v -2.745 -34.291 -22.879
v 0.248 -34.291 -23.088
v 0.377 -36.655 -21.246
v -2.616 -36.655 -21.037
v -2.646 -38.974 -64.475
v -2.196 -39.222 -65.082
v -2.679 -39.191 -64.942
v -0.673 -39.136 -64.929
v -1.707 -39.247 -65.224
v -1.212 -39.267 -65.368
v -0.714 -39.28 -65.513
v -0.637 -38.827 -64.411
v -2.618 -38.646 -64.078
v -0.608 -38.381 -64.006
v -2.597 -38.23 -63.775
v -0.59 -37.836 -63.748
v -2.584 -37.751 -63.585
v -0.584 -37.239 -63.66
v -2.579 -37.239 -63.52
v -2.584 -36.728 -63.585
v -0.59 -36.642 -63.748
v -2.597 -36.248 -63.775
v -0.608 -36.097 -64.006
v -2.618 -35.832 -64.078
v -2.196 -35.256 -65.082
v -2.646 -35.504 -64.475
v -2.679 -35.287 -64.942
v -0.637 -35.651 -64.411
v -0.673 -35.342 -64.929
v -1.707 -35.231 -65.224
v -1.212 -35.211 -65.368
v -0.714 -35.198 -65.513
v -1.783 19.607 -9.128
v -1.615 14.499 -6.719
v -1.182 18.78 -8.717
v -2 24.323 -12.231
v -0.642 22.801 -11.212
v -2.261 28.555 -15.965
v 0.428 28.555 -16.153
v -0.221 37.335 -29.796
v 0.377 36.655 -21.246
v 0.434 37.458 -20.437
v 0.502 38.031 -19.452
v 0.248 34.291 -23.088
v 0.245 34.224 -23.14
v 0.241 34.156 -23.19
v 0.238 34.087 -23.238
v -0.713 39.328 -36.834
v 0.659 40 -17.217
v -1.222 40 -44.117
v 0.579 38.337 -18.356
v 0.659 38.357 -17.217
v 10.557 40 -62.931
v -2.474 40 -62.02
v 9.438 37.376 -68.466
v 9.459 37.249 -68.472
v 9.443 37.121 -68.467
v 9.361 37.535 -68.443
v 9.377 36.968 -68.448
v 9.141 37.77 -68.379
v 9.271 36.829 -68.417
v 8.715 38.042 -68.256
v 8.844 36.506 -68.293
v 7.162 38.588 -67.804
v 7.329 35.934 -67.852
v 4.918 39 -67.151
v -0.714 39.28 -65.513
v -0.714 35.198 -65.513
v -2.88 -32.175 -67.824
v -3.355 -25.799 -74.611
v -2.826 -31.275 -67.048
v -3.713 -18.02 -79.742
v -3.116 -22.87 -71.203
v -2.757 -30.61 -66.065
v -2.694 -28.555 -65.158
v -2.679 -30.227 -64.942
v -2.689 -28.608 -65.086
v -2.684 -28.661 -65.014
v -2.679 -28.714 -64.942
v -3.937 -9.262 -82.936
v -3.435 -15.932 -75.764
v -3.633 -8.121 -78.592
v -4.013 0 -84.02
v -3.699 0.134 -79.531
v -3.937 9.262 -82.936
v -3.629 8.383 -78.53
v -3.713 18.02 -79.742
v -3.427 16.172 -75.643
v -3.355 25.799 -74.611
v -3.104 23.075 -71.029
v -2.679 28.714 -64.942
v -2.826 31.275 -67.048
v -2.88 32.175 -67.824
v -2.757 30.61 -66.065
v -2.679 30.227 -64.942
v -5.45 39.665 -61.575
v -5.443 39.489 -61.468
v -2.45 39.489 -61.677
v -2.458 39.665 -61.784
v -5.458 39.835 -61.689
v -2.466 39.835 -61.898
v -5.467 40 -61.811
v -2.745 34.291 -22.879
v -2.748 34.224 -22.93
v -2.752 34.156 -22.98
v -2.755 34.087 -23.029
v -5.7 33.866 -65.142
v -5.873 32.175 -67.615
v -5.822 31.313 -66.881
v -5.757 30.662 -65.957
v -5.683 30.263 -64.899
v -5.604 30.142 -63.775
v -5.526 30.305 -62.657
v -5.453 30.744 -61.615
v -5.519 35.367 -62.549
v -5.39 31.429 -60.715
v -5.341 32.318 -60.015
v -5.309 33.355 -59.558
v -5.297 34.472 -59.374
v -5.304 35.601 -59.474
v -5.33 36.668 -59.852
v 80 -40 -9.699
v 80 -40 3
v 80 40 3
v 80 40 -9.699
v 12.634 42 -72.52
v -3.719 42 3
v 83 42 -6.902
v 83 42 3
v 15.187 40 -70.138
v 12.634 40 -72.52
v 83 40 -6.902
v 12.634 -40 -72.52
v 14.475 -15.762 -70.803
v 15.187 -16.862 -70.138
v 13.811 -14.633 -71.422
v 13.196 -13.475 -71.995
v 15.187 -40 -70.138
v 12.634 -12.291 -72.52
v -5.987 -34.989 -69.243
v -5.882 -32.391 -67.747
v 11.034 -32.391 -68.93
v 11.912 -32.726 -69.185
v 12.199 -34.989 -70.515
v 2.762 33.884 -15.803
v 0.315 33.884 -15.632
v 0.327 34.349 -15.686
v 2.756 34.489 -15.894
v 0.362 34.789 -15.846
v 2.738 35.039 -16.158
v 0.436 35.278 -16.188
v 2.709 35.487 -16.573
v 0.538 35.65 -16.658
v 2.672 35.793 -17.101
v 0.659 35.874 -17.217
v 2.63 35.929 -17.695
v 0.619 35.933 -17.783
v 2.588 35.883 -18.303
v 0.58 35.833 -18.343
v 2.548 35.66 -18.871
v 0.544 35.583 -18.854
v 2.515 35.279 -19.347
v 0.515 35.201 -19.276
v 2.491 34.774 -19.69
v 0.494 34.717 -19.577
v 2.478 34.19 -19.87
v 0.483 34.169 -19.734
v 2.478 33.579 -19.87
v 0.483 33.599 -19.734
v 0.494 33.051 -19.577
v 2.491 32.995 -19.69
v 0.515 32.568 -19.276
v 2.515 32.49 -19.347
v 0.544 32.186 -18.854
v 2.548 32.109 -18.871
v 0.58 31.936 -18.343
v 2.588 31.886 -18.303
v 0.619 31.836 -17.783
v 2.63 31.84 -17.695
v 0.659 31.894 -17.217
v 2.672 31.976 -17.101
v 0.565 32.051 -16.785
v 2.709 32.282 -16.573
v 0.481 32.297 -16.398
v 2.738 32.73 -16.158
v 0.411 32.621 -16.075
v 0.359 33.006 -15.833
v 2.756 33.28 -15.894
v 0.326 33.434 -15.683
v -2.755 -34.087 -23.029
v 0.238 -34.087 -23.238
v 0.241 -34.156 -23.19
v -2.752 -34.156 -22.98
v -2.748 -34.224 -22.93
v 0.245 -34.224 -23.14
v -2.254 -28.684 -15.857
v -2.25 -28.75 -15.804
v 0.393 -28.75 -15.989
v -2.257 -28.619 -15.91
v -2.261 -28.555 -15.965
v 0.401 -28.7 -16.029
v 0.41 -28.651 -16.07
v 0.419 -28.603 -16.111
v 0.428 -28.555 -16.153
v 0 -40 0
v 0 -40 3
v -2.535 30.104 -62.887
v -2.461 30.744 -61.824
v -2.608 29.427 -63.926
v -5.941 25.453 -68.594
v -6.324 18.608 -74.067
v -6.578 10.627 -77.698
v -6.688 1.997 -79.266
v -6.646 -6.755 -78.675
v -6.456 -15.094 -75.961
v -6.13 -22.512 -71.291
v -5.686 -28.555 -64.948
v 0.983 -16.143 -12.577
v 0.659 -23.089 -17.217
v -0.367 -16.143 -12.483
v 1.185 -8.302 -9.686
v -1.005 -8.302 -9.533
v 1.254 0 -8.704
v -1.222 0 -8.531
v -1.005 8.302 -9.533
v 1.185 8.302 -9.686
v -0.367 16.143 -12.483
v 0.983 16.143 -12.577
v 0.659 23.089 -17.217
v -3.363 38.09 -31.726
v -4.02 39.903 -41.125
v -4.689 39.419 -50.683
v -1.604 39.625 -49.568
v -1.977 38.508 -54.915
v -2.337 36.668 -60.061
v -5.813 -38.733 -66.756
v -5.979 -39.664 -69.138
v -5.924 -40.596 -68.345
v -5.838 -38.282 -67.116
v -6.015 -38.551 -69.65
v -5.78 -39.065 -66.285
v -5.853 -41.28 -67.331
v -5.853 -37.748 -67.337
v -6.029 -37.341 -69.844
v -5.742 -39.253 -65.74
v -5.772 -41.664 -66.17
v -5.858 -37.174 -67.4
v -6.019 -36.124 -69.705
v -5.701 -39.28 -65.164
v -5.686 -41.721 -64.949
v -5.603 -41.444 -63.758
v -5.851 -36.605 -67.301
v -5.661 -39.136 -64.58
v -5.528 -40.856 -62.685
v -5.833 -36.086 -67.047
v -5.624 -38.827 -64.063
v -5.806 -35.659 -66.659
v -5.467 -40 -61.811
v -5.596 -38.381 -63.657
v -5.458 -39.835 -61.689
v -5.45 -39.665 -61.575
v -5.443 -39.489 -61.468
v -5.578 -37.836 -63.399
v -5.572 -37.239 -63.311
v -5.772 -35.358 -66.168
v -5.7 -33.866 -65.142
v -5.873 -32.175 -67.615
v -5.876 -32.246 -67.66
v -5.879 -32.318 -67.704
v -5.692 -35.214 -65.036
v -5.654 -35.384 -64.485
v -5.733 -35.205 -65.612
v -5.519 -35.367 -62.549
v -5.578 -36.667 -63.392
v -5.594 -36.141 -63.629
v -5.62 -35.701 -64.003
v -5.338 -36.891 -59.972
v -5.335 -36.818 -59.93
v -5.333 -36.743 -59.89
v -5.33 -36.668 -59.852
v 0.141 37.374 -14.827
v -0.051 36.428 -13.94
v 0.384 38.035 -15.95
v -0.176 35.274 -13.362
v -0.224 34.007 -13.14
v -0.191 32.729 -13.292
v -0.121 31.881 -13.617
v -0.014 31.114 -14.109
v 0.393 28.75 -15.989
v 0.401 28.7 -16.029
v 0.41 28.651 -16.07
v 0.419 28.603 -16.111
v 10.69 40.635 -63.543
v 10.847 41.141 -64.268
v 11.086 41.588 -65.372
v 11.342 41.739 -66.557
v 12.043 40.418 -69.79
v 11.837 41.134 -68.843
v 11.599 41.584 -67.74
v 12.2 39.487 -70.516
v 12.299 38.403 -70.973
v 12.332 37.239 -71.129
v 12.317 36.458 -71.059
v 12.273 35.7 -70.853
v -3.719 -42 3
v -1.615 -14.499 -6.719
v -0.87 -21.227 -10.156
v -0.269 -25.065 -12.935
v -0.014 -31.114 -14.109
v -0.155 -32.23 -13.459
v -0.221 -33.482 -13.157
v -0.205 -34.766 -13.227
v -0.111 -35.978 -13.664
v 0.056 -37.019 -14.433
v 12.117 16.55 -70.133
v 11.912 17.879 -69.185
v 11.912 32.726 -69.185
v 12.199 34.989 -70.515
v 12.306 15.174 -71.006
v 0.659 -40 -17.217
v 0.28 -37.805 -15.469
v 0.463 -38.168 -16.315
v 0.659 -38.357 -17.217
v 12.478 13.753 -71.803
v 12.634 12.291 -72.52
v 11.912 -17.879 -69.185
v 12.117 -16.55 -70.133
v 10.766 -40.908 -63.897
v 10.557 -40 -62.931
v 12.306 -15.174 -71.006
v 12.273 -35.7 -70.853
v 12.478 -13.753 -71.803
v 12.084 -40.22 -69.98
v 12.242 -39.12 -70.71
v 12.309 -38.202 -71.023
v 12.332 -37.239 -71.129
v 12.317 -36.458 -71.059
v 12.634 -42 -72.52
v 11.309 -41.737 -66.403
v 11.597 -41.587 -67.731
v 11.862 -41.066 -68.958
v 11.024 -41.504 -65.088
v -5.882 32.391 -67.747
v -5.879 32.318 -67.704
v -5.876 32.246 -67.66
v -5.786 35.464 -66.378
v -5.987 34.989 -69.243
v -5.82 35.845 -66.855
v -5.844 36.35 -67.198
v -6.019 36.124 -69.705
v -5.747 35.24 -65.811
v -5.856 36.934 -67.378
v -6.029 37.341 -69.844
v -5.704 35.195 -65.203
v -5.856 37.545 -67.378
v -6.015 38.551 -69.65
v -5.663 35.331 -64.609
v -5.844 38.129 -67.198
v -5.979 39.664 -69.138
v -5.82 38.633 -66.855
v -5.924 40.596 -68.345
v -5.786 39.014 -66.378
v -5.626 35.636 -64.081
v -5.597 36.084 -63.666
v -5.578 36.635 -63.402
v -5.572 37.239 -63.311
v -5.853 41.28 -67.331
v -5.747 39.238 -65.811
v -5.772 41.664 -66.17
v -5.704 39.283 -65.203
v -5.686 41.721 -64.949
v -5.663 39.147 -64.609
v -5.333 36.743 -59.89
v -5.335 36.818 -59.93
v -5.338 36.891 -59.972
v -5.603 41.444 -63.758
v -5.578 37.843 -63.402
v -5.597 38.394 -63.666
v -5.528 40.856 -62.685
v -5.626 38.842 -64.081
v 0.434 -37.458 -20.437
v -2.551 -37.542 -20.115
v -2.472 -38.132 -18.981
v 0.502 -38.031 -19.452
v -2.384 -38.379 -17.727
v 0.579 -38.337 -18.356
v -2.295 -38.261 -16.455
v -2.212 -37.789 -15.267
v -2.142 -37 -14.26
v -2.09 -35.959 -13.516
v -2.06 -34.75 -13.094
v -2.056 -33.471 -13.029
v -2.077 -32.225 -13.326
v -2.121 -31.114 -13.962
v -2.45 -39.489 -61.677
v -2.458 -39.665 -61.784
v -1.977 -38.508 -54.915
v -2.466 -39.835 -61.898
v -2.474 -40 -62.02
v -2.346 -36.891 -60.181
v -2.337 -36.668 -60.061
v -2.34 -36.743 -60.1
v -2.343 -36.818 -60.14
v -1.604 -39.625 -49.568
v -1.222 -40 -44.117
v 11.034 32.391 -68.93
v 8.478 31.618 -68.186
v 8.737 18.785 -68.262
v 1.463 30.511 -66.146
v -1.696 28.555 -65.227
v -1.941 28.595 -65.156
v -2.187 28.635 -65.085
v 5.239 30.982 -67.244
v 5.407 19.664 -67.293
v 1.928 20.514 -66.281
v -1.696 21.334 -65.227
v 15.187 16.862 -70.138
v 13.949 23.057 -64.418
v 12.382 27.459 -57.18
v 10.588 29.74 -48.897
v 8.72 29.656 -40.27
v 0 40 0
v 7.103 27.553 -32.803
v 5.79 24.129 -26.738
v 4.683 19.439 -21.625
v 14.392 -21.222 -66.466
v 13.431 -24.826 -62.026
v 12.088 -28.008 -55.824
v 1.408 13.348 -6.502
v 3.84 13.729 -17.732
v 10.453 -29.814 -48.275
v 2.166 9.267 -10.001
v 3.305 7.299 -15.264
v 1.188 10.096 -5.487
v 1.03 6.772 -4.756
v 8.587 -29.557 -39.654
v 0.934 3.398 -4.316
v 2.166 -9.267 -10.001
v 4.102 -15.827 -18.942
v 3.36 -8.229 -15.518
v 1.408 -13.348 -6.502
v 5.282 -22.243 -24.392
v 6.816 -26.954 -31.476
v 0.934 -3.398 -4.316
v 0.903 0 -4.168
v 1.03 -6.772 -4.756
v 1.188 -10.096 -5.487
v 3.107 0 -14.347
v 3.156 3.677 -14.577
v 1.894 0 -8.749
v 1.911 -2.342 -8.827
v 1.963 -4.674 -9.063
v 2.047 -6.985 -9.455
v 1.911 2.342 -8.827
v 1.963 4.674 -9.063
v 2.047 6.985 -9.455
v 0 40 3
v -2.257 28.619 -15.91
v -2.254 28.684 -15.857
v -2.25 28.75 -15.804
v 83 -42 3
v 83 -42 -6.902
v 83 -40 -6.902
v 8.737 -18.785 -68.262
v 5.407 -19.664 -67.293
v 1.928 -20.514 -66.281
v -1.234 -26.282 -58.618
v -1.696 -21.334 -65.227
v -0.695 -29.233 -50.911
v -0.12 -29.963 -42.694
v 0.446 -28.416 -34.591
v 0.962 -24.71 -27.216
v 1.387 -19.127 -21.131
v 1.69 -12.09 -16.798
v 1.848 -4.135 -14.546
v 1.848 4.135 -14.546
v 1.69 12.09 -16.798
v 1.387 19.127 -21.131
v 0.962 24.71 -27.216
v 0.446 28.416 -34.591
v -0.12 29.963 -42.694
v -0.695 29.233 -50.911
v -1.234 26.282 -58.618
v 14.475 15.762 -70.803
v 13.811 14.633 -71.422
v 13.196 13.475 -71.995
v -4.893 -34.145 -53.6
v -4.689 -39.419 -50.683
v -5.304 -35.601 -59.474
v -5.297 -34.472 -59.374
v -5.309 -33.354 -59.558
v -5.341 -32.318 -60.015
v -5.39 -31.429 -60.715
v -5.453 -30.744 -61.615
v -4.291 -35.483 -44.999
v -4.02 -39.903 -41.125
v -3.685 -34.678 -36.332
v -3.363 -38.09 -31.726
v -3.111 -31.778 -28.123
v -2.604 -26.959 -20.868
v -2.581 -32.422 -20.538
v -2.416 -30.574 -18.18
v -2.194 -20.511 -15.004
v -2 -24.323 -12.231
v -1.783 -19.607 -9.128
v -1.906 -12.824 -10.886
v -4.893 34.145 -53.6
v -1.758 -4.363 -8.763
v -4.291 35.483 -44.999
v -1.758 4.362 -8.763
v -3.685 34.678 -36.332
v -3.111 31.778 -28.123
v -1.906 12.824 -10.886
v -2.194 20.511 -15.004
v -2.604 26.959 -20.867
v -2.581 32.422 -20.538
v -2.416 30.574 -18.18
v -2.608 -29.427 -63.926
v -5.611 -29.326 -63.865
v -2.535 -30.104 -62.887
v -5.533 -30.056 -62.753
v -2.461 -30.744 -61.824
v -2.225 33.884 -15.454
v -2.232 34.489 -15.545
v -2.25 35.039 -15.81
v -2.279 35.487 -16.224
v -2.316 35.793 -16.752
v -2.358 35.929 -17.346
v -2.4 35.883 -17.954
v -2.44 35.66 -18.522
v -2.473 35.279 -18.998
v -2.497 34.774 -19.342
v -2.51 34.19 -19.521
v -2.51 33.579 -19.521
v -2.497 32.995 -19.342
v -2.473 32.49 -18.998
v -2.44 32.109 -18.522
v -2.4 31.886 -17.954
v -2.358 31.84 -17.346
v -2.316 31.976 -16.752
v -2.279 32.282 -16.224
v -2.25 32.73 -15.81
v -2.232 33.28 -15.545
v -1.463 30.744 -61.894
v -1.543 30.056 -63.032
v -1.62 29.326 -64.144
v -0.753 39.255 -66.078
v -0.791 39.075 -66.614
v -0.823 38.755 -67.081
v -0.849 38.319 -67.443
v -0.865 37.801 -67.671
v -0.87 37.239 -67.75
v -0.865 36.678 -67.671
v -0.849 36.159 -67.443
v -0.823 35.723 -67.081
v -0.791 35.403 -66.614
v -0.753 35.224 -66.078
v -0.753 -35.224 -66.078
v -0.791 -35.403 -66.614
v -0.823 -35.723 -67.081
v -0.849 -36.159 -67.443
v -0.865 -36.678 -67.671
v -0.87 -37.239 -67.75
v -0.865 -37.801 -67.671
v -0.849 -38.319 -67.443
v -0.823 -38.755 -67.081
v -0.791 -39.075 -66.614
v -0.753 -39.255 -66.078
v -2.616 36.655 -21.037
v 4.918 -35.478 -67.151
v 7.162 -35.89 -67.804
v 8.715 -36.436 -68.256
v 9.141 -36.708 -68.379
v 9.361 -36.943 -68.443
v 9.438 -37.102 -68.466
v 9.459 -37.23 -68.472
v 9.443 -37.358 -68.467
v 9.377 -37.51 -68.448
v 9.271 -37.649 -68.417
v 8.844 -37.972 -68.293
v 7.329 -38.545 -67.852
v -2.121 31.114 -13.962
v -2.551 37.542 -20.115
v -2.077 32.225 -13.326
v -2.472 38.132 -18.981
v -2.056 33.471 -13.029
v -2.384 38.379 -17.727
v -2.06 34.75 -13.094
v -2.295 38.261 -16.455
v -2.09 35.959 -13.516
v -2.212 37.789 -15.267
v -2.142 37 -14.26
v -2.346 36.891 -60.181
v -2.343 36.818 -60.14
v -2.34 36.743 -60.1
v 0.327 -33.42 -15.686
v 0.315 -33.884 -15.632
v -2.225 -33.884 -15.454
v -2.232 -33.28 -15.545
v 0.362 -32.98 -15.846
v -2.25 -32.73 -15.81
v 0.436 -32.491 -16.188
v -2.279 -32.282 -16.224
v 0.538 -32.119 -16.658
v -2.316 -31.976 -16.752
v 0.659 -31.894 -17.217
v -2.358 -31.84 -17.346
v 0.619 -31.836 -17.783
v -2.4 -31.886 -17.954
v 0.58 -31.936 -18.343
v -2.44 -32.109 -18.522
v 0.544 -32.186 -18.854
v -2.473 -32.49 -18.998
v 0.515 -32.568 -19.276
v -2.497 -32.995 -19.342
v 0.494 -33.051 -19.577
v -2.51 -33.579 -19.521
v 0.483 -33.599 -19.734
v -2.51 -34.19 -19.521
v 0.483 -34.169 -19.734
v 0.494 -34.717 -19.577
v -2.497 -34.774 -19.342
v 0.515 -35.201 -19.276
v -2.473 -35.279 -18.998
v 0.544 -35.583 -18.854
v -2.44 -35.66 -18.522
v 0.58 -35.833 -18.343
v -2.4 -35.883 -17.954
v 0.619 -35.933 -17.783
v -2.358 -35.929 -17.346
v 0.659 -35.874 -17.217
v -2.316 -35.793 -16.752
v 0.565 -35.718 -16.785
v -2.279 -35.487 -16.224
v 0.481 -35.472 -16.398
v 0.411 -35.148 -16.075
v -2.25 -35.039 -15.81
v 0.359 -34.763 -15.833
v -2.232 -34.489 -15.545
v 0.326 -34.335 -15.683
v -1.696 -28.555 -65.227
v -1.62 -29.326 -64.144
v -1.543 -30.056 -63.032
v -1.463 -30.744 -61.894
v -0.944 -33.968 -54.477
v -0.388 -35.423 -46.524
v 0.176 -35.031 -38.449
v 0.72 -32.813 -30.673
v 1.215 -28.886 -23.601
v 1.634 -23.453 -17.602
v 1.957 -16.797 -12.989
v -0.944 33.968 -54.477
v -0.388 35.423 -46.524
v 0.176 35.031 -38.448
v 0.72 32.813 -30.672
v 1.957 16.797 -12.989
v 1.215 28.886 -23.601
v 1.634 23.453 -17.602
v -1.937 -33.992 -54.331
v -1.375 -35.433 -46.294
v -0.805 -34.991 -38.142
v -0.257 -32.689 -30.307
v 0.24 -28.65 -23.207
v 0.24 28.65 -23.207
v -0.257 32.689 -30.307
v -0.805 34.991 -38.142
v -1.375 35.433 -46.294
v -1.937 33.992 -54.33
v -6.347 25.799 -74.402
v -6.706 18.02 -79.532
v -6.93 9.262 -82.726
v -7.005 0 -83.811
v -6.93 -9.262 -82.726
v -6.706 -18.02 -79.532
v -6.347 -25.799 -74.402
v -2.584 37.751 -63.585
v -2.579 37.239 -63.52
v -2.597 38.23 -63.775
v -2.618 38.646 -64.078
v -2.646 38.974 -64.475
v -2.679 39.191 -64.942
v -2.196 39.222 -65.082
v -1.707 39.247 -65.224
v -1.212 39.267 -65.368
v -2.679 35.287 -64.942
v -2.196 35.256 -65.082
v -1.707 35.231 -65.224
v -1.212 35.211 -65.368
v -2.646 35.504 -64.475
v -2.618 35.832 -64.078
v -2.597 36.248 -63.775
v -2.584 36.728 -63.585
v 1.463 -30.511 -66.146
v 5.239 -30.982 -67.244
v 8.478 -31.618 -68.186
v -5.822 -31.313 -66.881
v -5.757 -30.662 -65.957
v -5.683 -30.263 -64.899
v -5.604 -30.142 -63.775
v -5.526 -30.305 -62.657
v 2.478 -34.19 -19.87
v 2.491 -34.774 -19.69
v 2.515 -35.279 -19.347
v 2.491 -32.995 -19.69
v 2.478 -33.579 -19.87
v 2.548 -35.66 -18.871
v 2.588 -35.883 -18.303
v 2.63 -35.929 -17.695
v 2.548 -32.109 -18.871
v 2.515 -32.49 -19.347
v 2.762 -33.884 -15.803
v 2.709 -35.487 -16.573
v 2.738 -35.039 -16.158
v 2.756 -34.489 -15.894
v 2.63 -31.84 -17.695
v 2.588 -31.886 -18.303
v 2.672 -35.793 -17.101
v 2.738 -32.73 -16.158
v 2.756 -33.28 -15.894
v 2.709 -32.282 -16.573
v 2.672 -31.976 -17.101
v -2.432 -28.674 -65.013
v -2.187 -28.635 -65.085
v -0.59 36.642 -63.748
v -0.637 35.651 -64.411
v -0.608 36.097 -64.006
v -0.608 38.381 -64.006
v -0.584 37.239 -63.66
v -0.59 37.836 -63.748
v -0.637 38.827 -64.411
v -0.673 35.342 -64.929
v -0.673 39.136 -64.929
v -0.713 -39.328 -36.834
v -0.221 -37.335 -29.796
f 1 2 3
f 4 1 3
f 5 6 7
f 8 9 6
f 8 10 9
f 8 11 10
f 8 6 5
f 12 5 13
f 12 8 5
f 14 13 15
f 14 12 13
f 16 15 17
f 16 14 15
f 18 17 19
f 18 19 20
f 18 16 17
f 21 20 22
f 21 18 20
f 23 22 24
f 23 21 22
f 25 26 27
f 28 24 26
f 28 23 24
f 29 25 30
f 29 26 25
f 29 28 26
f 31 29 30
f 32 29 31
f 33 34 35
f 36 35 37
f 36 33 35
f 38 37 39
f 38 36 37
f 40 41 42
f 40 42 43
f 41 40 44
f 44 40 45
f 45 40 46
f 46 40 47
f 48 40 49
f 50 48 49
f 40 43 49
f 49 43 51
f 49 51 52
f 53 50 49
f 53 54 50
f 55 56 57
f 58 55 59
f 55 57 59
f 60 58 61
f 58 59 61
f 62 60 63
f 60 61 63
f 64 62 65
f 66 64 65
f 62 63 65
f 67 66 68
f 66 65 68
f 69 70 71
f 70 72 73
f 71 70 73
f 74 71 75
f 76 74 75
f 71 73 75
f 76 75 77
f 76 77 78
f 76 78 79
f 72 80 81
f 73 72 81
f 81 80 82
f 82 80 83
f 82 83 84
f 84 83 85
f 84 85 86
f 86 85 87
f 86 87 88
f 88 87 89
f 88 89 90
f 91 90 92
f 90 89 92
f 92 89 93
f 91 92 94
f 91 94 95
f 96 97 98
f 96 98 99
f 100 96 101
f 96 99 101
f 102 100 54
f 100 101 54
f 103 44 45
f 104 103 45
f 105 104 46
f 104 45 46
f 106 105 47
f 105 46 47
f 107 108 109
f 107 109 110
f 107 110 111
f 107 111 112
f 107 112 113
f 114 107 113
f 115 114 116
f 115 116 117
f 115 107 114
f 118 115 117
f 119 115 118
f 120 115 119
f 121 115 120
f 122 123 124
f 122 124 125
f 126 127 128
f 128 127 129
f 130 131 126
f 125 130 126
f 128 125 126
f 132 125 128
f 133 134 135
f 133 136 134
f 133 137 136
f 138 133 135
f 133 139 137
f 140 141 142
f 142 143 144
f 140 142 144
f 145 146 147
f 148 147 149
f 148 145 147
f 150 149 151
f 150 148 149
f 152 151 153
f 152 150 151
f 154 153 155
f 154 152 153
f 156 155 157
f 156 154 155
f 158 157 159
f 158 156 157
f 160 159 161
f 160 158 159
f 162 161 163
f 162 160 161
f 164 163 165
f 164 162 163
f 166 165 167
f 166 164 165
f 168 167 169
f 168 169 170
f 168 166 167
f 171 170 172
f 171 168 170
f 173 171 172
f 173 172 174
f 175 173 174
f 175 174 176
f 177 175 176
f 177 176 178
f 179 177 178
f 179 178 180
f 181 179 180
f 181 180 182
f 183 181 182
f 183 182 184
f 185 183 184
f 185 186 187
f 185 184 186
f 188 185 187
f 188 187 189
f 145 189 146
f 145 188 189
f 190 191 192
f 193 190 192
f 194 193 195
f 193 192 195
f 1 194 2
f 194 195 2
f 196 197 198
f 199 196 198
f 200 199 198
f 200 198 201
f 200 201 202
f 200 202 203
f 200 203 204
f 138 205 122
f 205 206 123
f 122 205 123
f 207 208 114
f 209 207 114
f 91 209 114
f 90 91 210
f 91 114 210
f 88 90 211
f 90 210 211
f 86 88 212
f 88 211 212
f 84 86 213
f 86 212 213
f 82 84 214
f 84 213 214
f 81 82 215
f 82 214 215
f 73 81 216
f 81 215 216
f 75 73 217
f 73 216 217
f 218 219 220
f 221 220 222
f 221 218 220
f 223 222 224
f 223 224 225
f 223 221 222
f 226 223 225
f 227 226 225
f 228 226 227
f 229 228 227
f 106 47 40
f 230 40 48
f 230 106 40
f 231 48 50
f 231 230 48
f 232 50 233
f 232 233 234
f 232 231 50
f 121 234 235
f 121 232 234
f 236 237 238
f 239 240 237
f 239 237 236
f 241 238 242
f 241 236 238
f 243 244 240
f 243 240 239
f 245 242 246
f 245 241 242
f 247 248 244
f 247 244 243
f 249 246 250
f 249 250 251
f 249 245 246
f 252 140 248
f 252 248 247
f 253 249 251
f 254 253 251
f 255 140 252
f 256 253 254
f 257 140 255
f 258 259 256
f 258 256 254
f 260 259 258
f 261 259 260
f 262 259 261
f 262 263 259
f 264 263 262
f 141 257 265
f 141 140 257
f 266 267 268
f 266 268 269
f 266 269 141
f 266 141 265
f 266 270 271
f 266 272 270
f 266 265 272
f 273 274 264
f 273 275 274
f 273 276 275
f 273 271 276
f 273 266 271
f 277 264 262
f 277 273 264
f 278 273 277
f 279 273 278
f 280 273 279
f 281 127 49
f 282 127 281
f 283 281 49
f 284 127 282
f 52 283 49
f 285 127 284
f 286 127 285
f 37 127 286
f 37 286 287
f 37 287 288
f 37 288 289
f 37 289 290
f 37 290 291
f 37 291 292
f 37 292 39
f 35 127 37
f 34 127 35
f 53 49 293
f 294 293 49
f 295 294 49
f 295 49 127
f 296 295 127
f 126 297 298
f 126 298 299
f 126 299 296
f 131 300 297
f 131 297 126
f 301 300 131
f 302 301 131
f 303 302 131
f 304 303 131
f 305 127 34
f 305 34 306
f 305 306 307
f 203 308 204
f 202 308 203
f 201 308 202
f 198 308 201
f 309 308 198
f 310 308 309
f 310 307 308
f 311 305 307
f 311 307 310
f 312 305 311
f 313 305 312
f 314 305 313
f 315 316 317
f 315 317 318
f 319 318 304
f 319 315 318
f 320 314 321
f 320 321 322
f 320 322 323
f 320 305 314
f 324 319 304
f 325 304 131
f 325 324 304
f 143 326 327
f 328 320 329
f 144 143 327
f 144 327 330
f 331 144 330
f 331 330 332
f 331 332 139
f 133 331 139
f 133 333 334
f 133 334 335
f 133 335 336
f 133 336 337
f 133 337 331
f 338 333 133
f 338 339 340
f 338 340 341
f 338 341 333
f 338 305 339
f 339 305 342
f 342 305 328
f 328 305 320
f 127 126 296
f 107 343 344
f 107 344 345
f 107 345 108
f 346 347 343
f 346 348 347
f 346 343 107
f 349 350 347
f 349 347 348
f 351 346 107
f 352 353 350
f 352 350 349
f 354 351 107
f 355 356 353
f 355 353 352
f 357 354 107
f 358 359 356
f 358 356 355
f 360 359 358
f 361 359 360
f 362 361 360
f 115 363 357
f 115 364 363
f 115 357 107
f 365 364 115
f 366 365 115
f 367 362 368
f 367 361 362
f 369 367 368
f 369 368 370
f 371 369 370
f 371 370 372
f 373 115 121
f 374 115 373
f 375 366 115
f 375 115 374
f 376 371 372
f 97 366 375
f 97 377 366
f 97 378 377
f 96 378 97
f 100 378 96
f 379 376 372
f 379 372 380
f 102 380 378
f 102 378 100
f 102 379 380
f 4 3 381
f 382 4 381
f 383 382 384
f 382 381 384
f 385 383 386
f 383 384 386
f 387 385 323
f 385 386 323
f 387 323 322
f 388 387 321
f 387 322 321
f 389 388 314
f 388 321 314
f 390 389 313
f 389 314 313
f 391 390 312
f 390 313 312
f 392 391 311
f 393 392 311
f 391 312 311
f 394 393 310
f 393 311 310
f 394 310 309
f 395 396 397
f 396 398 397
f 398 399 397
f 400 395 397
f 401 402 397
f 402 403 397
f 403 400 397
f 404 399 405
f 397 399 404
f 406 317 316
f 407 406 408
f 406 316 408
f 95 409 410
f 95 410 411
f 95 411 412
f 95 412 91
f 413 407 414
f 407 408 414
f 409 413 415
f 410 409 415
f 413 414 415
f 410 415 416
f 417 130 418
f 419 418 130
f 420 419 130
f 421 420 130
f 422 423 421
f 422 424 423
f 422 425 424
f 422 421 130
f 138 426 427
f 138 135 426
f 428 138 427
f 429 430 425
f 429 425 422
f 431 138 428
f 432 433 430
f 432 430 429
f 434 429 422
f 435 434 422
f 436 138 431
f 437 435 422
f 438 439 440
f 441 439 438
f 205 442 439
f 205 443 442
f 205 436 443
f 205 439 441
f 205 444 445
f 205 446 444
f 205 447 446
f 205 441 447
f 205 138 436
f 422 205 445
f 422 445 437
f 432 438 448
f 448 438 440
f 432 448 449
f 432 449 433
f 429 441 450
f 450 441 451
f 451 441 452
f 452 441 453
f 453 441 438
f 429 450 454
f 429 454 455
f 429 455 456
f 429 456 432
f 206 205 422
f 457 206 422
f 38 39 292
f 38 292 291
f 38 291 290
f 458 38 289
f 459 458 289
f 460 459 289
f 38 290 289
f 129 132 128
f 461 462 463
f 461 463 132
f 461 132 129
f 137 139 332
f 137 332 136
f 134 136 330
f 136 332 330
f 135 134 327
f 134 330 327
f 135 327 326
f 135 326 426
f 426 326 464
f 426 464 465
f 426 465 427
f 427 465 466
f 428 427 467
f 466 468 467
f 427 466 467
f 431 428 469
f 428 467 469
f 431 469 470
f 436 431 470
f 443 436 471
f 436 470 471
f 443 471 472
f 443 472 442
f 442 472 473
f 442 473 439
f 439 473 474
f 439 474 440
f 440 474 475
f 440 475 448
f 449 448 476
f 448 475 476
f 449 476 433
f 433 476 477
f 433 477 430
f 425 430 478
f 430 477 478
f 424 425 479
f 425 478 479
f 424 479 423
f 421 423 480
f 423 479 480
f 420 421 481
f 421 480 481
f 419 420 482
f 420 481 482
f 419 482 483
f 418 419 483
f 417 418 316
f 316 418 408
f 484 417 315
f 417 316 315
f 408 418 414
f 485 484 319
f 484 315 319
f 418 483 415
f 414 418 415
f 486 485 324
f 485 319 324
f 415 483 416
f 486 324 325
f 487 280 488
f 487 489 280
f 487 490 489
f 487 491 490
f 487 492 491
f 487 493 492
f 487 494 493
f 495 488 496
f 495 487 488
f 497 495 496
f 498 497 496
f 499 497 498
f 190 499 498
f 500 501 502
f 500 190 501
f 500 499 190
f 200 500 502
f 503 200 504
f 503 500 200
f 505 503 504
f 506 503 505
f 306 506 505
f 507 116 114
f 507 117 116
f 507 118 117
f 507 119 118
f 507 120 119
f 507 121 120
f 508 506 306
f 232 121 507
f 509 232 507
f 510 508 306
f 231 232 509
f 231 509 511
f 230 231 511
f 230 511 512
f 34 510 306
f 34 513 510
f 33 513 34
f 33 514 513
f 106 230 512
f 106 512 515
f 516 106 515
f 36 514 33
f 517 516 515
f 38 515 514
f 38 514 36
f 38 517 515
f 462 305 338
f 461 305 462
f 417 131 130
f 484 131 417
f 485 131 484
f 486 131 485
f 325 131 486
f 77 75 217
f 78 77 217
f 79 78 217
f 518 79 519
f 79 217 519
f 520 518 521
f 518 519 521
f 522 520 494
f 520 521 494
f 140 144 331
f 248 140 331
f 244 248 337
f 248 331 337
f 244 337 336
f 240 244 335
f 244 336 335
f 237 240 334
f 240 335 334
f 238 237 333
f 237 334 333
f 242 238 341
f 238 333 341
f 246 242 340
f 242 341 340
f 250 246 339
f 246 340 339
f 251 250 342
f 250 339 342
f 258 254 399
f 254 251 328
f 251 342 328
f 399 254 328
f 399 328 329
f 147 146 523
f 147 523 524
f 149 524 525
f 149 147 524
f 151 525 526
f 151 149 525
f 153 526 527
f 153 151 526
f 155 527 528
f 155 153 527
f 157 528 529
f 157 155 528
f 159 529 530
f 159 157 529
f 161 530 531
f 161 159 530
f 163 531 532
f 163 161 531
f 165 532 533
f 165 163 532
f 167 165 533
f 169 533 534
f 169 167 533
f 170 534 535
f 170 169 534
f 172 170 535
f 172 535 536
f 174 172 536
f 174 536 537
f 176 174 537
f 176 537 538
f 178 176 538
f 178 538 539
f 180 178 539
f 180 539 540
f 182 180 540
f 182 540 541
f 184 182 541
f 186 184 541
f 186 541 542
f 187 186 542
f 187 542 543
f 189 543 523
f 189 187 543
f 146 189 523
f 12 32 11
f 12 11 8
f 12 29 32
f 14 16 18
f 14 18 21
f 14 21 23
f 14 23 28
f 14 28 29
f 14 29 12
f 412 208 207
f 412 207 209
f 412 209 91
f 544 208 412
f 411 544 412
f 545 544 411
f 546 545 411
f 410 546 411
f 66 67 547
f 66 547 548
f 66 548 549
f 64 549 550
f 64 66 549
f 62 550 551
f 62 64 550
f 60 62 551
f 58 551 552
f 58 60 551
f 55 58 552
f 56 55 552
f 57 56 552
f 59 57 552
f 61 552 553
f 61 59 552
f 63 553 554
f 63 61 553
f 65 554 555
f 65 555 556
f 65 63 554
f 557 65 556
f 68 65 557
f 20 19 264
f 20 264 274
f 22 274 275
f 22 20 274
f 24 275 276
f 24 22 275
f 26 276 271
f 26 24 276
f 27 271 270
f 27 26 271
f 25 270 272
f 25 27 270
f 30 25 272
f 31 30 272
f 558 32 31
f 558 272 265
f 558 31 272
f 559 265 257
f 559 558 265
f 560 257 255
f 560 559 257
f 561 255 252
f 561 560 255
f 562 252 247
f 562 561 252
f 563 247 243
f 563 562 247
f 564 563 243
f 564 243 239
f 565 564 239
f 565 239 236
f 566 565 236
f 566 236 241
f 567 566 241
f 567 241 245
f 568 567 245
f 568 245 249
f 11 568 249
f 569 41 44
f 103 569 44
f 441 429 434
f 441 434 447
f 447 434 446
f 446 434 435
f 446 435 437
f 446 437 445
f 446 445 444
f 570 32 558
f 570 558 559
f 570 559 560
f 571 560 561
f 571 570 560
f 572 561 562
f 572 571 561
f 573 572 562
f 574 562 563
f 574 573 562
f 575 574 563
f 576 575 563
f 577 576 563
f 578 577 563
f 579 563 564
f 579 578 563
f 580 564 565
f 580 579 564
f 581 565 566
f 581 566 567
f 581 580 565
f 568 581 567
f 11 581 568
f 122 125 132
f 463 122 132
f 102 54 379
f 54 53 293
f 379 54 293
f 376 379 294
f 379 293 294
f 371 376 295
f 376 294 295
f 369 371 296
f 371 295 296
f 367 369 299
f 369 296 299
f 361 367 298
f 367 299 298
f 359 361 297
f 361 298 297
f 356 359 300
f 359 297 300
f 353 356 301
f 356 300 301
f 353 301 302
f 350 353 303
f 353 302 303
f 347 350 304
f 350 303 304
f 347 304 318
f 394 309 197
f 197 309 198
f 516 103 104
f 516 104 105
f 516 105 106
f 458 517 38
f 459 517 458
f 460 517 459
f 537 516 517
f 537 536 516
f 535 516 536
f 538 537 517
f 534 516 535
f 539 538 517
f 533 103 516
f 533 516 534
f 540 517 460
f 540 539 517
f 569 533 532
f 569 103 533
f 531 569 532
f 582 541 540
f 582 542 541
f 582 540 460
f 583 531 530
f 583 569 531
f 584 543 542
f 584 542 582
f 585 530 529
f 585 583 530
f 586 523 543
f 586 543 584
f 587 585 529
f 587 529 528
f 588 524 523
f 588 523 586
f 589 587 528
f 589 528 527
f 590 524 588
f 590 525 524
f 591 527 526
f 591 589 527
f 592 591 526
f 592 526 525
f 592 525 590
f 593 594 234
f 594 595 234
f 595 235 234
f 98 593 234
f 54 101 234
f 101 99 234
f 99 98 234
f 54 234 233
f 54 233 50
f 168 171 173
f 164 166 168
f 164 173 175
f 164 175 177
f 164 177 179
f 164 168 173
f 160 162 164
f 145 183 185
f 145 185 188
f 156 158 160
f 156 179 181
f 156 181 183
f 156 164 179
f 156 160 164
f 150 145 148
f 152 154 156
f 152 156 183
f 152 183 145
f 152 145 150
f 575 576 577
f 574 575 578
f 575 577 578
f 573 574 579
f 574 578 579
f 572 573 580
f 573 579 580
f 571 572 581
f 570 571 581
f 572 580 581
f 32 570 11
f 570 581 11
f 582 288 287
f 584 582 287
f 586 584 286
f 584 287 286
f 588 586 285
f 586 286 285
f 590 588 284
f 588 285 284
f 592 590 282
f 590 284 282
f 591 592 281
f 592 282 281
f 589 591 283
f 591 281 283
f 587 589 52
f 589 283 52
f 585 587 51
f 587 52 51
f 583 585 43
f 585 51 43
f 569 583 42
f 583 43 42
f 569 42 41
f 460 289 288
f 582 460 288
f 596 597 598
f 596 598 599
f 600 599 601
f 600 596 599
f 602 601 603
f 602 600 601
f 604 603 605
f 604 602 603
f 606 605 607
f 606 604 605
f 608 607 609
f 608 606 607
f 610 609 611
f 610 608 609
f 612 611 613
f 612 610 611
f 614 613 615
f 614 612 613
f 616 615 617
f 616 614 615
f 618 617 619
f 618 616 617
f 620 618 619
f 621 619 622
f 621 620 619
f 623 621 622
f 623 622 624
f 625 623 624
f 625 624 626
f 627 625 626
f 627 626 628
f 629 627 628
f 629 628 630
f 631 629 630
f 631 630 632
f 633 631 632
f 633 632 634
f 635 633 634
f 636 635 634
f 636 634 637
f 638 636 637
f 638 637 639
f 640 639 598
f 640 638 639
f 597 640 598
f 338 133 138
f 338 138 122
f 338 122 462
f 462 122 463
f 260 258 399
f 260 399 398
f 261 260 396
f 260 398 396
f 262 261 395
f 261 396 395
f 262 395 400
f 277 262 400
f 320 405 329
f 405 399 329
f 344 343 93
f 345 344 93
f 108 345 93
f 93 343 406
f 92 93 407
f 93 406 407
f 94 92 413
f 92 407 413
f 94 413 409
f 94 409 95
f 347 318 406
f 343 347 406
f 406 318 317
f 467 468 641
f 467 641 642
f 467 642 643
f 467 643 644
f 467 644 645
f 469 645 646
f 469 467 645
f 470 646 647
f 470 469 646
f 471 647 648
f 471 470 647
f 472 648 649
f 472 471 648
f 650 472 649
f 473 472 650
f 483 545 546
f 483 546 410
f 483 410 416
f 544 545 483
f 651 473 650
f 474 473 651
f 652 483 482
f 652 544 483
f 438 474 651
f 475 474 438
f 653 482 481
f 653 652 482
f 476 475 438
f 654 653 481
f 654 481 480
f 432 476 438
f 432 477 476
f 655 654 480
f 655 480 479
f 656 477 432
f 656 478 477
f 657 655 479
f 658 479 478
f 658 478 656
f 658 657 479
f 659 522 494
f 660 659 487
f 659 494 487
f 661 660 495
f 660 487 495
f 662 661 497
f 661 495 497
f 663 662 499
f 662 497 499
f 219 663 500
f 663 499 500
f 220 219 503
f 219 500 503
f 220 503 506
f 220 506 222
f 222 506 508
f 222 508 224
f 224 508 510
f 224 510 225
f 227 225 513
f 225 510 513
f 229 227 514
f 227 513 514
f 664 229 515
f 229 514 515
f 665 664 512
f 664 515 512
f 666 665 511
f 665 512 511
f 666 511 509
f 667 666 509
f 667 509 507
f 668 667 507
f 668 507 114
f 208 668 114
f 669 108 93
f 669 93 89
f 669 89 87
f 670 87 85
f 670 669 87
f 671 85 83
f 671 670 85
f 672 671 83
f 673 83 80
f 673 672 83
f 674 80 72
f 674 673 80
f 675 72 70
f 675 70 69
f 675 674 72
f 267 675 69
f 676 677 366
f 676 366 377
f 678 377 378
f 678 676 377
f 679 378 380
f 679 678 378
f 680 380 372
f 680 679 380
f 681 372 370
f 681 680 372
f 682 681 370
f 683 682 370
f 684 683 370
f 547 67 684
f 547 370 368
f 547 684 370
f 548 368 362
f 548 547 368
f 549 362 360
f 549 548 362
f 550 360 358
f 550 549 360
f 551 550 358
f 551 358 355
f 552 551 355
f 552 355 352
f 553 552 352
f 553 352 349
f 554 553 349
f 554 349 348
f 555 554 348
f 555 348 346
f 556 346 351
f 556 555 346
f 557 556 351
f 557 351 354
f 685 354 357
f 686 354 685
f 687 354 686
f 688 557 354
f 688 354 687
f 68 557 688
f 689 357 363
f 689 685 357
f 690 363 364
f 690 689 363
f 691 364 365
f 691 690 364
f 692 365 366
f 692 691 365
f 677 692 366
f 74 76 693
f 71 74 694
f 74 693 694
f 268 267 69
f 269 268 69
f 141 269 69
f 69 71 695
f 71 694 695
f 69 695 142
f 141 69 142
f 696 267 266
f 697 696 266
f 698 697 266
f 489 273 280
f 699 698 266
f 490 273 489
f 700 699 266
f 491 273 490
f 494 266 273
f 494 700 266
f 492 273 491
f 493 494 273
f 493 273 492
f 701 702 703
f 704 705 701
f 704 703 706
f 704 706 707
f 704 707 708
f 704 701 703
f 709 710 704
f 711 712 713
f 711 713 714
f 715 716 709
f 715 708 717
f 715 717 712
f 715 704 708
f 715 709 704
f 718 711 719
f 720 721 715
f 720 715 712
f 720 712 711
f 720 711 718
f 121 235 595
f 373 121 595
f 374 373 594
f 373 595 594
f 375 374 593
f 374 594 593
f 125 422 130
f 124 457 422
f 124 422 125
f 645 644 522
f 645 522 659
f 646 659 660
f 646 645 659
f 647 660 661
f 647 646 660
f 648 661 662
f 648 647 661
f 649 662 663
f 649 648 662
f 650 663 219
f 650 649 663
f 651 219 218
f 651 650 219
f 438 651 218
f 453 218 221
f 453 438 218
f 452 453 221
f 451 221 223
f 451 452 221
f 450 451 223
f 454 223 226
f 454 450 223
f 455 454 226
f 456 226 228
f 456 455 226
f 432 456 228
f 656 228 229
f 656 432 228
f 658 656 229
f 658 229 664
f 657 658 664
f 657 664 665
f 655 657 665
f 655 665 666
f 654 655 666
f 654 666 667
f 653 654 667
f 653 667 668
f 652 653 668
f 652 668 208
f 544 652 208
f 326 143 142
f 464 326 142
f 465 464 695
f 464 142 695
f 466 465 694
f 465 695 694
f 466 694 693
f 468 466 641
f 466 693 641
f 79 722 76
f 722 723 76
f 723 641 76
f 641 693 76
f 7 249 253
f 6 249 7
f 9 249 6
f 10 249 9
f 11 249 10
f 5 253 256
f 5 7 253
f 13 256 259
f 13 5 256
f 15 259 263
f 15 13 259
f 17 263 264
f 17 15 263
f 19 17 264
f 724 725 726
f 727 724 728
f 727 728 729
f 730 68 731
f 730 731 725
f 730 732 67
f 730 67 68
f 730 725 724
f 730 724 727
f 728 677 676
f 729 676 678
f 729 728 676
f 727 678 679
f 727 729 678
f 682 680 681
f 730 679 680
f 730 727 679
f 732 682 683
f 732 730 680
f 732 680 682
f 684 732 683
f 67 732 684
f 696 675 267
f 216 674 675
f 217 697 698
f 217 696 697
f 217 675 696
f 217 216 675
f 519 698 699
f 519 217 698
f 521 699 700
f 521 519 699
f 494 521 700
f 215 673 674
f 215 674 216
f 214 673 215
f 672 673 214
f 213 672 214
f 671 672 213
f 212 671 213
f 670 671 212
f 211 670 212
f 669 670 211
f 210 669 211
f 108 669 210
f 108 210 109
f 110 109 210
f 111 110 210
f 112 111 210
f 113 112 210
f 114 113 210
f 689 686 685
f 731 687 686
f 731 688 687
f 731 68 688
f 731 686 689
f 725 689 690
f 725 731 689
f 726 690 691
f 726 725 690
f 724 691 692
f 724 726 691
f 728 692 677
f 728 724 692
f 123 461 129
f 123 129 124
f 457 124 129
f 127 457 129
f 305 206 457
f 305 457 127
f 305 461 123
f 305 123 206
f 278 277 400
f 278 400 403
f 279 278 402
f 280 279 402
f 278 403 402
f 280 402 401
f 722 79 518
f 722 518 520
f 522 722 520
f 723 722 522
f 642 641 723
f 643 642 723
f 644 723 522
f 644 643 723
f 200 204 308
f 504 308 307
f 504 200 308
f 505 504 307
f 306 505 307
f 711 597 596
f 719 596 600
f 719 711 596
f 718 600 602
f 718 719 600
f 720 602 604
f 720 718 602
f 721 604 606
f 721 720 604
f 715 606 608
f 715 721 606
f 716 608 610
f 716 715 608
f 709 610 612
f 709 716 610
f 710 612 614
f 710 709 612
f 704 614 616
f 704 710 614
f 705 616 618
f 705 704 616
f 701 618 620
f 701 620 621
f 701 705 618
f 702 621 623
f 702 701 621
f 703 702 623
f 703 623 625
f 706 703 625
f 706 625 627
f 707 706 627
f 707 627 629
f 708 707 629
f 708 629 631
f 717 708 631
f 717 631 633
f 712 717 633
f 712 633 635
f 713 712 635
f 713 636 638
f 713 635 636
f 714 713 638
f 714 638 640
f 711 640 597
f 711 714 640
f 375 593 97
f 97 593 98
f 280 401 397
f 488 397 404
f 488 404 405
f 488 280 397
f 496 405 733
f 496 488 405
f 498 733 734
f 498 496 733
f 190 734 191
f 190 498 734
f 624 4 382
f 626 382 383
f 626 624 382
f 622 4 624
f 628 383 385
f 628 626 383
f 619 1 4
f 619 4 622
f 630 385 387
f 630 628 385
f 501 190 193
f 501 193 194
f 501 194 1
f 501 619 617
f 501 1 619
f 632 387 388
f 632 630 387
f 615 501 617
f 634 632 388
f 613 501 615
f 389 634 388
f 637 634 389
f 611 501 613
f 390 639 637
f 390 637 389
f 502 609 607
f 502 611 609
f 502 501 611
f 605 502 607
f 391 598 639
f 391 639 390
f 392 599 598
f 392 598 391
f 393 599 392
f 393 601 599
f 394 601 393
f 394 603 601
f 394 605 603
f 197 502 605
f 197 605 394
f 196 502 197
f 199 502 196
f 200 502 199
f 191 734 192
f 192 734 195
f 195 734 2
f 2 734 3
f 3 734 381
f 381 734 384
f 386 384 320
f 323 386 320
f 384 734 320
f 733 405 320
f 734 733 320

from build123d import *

# Parameters (mm, degrees)
EXTRUDE_1_DEPTH                 = 40
EXTRUDE_1_DEPTH_BACK            = 40
EXTRUDE_2_DEPTH                 = 2
CUT_EXTRUDE_1_REACH             = 119.95
SKETCH_5_W                      = 80
SKETCH_5_H                      = 80
EXTRUDE_3_DEPTH                 = 40
EXTRUDE_3_DEPTH_BACK            = 40
SKETCH_8_R                      = 35.5
CUT_EXTRUDE_2_DEPTH             = 1
CUT_EXTRUDE_2_DIRECTION_2_REACH = 118.572
EXTRUDE_START                   = 3
SKETCH_9_R                      = 40
SKETCH_9_R_2                    = 35.5
EXTRUDE_4_DEPTH                 = 3
CUT_EXTRUDE_3_REACH             = 127.349
SKETCH_10_W                     = 71.763601152
SKETCH_10_H                     = 80
CUT_EXTRUDE_4_REACH             = 128.159
SKETCH_11_R                     = 30
EXTRUDE_5_REACH                 = 128.159
SKETCH_12_R                     = 2.05
SKETCH_13_R                     = 2.05
CUT_EXTRUDE_5_DEPTH             = 5


with BuildPart() as part:
    # 草图3 → 凸台-拉伸1 (new, two sides: drawn at the far end of the back side and taken through both)
    with BuildSketch(Plane(origin=(0, 0, 0), x_dir=(1, 0, 0), z_dir=(0, 1, 0)).offset(-EXTRUDE_1_DEPTH_BACK)):
        Polygon((15.187390863, 70.138132347), (0, 0), (80, 0), (80, 9.699396554), (83, 6.901851296), (83, -3), (-3.719132052, -3), (12.633544334, 72.519632763), align=None)
    extrude(amount=EXTRUDE_1_DEPTH + EXTRUDE_1_DEPTH_BACK)

    # 草图4 → 凸台-拉伸2 (add)
    with BuildSketch(Plane.XZ.offset(40)):
        Polygon((12.633544334, -72.519632763), (83, -6.901851296), (83, 3), (-3.719132052, 3), align=None)
    extrude_2 = extrude(amount=EXTRUDE_2_DEPTH)

    # 镜向1: 凸台-拉伸2 across plane
    add(extrude_2.mirror(Plane.ZX))

    # 草图5 → 切除-拉伸1 (cut, up to next)
    with BuildSketch(Plane(origin=(0, 0, 0), x_dir=(-1, 0, 0), z_dir=(0, 0, -1)), mode=Mode.PRIVATE) as cut_extrude_1_sk1:
        with Locations((-40, 0)):
            Rectangle(SKETCH_5_W, SKETCH_5_H)
    cut_extrude_1_tool1 = extrude(cut_extrude_1_sk1.sketch, amount=-CUT_EXTRUDE_1_REACH, mode=Mode.PRIVATE) & part.part
    add(cut_extrude_1_tool1.solids().sort_by_distance((40, 0, 0))[0], mode=Mode.SUBTRACT)

    # 草图7 → 凸台-拉伸3 (add, two sides: drawn at the far end of the back side and taken through both)
    with BuildSketch(Plane(origin=(0, 0, 0), x_dir=(1, 0, 0), z_dir=(0, 1, 0)).offset(-EXTRUDE_3_DEPTH_BACK)):
        Polygon((0.658640833, 17.217351141), (11.911542727, 69.185298069), (-2.678558655, 64.941527254), align=None)
    extrude(amount=EXTRUDE_3_DEPTH + EXTRUDE_3_DEPTH_BACK)

    # 草图8 → 切除-拉伸2 (cut)
    with BuildSketch(Plane(origin=(1.853531984, 0, -0.129611582), x_dir=(0.06975647374411541, 0, 0.997564050259825), z_dir=(-0.9975640502598251, 0, 0.06975647374411541))):
        with Locations((-44.095251412, 0)):
            Circle(SKETCH_8_R)
    extrude(amount=-CUT_EXTRUDE_2_DEPTH, mode=Mode.SUBTRACT)

    # 草图8 → 切除-拉伸2 direction 2 (cut, up to next)
    with BuildSketch(Plane(origin=(1.853531984, 0, -0.129611582), x_dir=(0.06975647374411541, 0, 0.997564050259825), z_dir=(-0.9975640502598251, 0, 0.06975647374411541)), mode=Mode.PRIVATE) as cut_extrude_2_direction_2_sk1:
        with Locations((-44.095251412, 0)):
            Circle(SKETCH_8_R)
    cut_extrude_2_direction_2_tool1 = extrude(cut_extrude_2_direction_2_sk1.sketch, amount=CUT_EXTRUDE_2_DIRECTION_2_REACH, mode=Mode.PRIVATE) & part.part
    add(cut_extrude_2_direction_2_tool1.solids().sort_by_distance((-1.222397, 0, -44.117449))[0], mode=Mode.SUBTRACT)

    # 草图9 → 凸台-拉伸4 (add)
    with BuildSketch(Plane(origin=(1.853531984, 0, -0.129611582), x_dir=(0.06975647374411541, 0, 0.997564050259825), z_dir=(-0.9975640502598251, 0, 0.06975647374411541)).offset(EXTRUDE_START)):
        with Locations((-44.095251412, 0)):
            Circle(SKETCH_9_R)
        with Locations((-44.095251412, 0)):
            Circle(SKETCH_9_R_2, mode=Mode.SUBTRACT)
    extrude(amount=-EXTRUDE_4_DEPTH)

    # 草图10 → 切除-拉伸3 (cut, up to next)
    with BuildSketch(Plane(origin=(0, 0, 0), x_dir=(0.21163083539135819, 0, -0.9773496761709987), z_dir=(0.9773496761709987, 0, 0.21163083539135819)), mode=Mode.PRIVATE) as cut_extrude_3_sk1:
        with Locations((35.881800576, 0)):
            Rectangle(SKETCH_10_W, SKETCH_10_H)
    cut_extrude_3_tool1 = extrude(cut_extrude_3_sk1.sketch, amount=CUT_EXTRUDE_3_REACH, mode=Mode.PRIVATE) & part.part
    add(cut_extrude_3_tool1.solids().sort_by_distance((7.593695, 0, -35.069066))[0], mode=Mode.SUBTRACT)

    # 草图11 → 切除-拉伸4 (cut, up to next)
    with BuildSketch(Plane(origin=(-1.139160167, 0, 0.079657839), x_dir=(0.06975647374411542, 0, 0.997564050259825), z_dir=(-0.9975640502598251, 0, 0.06975647374411542)), mode=Mode.PRIVATE) as cut_extrude_4_sk1:
        with Locations((-44.095251412, 0)):
            Circle(SKETCH_11_R)
    cut_extrude_4_tool1 = extrude(cut_extrude_4_sk1.sketch, amount=-CUT_EXTRUDE_4_REACH, mode=Mode.PRIVATE) & part.part
    add(cut_extrude_4_tool1.solids().sort_by_distance((-4.215089, 0, -43.90818))[0], mode=Mode.SUBTRACT)

    # 草图12 → 凸台-拉伸5 (add, up to next)
    with BuildSketch(Plane(origin=(-1.139160167, 0, 0.079657839), x_dir=(0.06975647374411542, 0, 0.997564050259825), z_dir=(-0.9975640502598251, 0, 0.06975647374411542)), mode=Mode.PRIVATE) as extrude_5_sk1:
        with BuildLine():
            Line((-61.698137095, 39.489092363), (-60.198137095, 36.891016151))
            ThreePointArc((-60.198137095, 36.891016151), (-61.845251412, 30.743901834), (-67.992365729, 32.391016151))
            Line((-67.992365729, 32.391016151), (-69.492365729, 34.989092363))
            ThreePointArc((-69.492365729, 34.989092363), (-67.845251412, 41.13620668), (-61.698137095, 39.489092363))
        make_face()
        with Locations((-65.595251412, 37.239092363)):
            Circle(SKETCH_12_R, mode=Mode.SUBTRACT)
    extrude_5_tool1 = extrude(extrude_5_sk1.sketch, amount=-EXTRUDE_5_REACH, mode=Mode.PRIVATE) - part.part
    # 草图12 → 凸台-拉伸5 (add, up to next)
    with BuildSketch(Plane(origin=(-1.139160167, 0, 0.079657839), x_dir=(0.06975647374411542, 0, 0.997564050259825), z_dir=(-0.9975640502598251, 0, 0.06975647374411542)), mode=Mode.PRIVATE) as extrude_5_sk2:
        with BuildLine():
            Line((-14.075759582, 31.113985766), (-15.922744008, 28.749953505))
            ThreePointArc((-15.922744008, 28.749953505), (-22.239269038, 27.974381753), (-23.014840791, 34.290906783))
            Line((-23.014840791, 34.290906783), (-21.167856365, 36.654939044))
            ThreePointArc((-21.167856365, 36.654939044), (-14.851331334, 37.430510796), (-14.075759582, 31.113985766))
        make_face()
        with Locations((-17.621807973, 33.884462405)):
            Circle(SKETCH_12_R, mode=Mode.SUBTRACT)
    extrude_5_tool2 = extrude(extrude_5_sk2.sketch, amount=-EXTRUDE_5_REACH, mode=Mode.PRIVATE) - part.part
    # 草图12 → 凸台-拉伸5 (add, up to next)
    with BuildSketch(Plane(origin=(-1.139160167, 0, 0.079657839), x_dir=(0.06975647374411542, 0, 0.997564050259825), z_dir=(-0.9975640502598251, 0, 0.06975647374411542)), mode=Mode.PRIVATE) as extrude_5_sk3:
        with BuildLine():
            Line((-14.075759582, -31.113985766), (-15.922744008, -28.749953505))
            ThreePointArc((-15.922744008, -28.749953505), (-22.239269038, -27.974381753), (-23.014840791, -34.290906783))
            Line((-23.014840791, -34.290906783), (-21.167856365, -36.654939044))
            ThreePointArc((-21.167856365, -36.654939044), (-14.851331334, -37.430510796), (-14.075759582, -31.113985766))
        make_face()
        with Locations((-17.621807973, -33.884462405)):
            Circle(SKETCH_12_R, mode=Mode.SUBTRACT)
    extrude_5_tool3 = extrude(extrude_5_sk3.sketch, amount=-EXTRUDE_5_REACH, mode=Mode.PRIVATE) - part.part
    # 草图12 → 凸台-拉伸5 (add, up to next)
    with BuildSketch(Plane(origin=(-1.139160167, 0, 0.079657839), x_dir=(0.06975647374411542, 0, 0.997564050259825), z_dir=(-0.9975640502598251, 0, 0.06975647374411542)), mode=Mode.PRIVATE) as extrude_5_sk4:
        with BuildLine():
            Line((-61.698137095, -39.489092363), (-60.198137095, -36.891016151))
            ThreePointArc((-60.198137095, -36.891016151), (-61.845251412, -30.743901834), (-67.992365729, -32.391016151))
            Line((-67.992365729, -32.391016151), (-69.492365729, -34.989092363))
            ThreePointArc((-69.492365729, -34.989092363), (-67.845251412, -41.13620668), (-61.698137095, -39.489092363))
        make_face()
        with Locations((-65.595251412, -37.239092363)):
            Circle(SKETCH_12_R, mode=Mode.SUBTRACT)
    extrude_5_tool4 = extrude(extrude_5_sk4.sketch, amount=-EXTRUDE_5_REACH, mode=Mode.PRIVATE) - part.part
    add(extrude_5_tool1.solids().sort_by_distance((-5.400139, 38.111829, -60.855172))[0])
    add(extrude_5_tool2.solids().sort_by_distance((-2.194091, 30.028689, -15.00655))[0])
    add(extrude_5_tool3.solids().sort_by_distance((-2.194091, -30.028689, -15.00655))[0])
    add(extrude_5_tool4.solids().sort_by_distance((-5.400139, -38.111829, -60.855172))[0])

    # 草图13 → 切除-拉伸5 (cut)
    with BuildSketch(Plane(origin=(-1.139160167, 0, 0.079657839), x_dir=(0.06975647374411542, 0, 0.997564050259825), z_dir=(-0.9975640502598251, 0, 0.06975647374411542))):
        with Locations((-65.595251412, -37.239092363)):
            Circle(SKETCH_13_R)
        with Locations((-17.621807973, -33.884462405)):
            Circle(SKETCH_13_R)
        with Locations((-17.621807973, 33.884462405)):
            Circle(SKETCH_13_R)
        with Locations((-65.595251412, 37.239092363)):
            Circle(SKETCH_13_R)
    extrude(amount=-CUT_EXTRUDE_5_DEPTH, mode=Mode.SUBTRACT)


solid = part.part
